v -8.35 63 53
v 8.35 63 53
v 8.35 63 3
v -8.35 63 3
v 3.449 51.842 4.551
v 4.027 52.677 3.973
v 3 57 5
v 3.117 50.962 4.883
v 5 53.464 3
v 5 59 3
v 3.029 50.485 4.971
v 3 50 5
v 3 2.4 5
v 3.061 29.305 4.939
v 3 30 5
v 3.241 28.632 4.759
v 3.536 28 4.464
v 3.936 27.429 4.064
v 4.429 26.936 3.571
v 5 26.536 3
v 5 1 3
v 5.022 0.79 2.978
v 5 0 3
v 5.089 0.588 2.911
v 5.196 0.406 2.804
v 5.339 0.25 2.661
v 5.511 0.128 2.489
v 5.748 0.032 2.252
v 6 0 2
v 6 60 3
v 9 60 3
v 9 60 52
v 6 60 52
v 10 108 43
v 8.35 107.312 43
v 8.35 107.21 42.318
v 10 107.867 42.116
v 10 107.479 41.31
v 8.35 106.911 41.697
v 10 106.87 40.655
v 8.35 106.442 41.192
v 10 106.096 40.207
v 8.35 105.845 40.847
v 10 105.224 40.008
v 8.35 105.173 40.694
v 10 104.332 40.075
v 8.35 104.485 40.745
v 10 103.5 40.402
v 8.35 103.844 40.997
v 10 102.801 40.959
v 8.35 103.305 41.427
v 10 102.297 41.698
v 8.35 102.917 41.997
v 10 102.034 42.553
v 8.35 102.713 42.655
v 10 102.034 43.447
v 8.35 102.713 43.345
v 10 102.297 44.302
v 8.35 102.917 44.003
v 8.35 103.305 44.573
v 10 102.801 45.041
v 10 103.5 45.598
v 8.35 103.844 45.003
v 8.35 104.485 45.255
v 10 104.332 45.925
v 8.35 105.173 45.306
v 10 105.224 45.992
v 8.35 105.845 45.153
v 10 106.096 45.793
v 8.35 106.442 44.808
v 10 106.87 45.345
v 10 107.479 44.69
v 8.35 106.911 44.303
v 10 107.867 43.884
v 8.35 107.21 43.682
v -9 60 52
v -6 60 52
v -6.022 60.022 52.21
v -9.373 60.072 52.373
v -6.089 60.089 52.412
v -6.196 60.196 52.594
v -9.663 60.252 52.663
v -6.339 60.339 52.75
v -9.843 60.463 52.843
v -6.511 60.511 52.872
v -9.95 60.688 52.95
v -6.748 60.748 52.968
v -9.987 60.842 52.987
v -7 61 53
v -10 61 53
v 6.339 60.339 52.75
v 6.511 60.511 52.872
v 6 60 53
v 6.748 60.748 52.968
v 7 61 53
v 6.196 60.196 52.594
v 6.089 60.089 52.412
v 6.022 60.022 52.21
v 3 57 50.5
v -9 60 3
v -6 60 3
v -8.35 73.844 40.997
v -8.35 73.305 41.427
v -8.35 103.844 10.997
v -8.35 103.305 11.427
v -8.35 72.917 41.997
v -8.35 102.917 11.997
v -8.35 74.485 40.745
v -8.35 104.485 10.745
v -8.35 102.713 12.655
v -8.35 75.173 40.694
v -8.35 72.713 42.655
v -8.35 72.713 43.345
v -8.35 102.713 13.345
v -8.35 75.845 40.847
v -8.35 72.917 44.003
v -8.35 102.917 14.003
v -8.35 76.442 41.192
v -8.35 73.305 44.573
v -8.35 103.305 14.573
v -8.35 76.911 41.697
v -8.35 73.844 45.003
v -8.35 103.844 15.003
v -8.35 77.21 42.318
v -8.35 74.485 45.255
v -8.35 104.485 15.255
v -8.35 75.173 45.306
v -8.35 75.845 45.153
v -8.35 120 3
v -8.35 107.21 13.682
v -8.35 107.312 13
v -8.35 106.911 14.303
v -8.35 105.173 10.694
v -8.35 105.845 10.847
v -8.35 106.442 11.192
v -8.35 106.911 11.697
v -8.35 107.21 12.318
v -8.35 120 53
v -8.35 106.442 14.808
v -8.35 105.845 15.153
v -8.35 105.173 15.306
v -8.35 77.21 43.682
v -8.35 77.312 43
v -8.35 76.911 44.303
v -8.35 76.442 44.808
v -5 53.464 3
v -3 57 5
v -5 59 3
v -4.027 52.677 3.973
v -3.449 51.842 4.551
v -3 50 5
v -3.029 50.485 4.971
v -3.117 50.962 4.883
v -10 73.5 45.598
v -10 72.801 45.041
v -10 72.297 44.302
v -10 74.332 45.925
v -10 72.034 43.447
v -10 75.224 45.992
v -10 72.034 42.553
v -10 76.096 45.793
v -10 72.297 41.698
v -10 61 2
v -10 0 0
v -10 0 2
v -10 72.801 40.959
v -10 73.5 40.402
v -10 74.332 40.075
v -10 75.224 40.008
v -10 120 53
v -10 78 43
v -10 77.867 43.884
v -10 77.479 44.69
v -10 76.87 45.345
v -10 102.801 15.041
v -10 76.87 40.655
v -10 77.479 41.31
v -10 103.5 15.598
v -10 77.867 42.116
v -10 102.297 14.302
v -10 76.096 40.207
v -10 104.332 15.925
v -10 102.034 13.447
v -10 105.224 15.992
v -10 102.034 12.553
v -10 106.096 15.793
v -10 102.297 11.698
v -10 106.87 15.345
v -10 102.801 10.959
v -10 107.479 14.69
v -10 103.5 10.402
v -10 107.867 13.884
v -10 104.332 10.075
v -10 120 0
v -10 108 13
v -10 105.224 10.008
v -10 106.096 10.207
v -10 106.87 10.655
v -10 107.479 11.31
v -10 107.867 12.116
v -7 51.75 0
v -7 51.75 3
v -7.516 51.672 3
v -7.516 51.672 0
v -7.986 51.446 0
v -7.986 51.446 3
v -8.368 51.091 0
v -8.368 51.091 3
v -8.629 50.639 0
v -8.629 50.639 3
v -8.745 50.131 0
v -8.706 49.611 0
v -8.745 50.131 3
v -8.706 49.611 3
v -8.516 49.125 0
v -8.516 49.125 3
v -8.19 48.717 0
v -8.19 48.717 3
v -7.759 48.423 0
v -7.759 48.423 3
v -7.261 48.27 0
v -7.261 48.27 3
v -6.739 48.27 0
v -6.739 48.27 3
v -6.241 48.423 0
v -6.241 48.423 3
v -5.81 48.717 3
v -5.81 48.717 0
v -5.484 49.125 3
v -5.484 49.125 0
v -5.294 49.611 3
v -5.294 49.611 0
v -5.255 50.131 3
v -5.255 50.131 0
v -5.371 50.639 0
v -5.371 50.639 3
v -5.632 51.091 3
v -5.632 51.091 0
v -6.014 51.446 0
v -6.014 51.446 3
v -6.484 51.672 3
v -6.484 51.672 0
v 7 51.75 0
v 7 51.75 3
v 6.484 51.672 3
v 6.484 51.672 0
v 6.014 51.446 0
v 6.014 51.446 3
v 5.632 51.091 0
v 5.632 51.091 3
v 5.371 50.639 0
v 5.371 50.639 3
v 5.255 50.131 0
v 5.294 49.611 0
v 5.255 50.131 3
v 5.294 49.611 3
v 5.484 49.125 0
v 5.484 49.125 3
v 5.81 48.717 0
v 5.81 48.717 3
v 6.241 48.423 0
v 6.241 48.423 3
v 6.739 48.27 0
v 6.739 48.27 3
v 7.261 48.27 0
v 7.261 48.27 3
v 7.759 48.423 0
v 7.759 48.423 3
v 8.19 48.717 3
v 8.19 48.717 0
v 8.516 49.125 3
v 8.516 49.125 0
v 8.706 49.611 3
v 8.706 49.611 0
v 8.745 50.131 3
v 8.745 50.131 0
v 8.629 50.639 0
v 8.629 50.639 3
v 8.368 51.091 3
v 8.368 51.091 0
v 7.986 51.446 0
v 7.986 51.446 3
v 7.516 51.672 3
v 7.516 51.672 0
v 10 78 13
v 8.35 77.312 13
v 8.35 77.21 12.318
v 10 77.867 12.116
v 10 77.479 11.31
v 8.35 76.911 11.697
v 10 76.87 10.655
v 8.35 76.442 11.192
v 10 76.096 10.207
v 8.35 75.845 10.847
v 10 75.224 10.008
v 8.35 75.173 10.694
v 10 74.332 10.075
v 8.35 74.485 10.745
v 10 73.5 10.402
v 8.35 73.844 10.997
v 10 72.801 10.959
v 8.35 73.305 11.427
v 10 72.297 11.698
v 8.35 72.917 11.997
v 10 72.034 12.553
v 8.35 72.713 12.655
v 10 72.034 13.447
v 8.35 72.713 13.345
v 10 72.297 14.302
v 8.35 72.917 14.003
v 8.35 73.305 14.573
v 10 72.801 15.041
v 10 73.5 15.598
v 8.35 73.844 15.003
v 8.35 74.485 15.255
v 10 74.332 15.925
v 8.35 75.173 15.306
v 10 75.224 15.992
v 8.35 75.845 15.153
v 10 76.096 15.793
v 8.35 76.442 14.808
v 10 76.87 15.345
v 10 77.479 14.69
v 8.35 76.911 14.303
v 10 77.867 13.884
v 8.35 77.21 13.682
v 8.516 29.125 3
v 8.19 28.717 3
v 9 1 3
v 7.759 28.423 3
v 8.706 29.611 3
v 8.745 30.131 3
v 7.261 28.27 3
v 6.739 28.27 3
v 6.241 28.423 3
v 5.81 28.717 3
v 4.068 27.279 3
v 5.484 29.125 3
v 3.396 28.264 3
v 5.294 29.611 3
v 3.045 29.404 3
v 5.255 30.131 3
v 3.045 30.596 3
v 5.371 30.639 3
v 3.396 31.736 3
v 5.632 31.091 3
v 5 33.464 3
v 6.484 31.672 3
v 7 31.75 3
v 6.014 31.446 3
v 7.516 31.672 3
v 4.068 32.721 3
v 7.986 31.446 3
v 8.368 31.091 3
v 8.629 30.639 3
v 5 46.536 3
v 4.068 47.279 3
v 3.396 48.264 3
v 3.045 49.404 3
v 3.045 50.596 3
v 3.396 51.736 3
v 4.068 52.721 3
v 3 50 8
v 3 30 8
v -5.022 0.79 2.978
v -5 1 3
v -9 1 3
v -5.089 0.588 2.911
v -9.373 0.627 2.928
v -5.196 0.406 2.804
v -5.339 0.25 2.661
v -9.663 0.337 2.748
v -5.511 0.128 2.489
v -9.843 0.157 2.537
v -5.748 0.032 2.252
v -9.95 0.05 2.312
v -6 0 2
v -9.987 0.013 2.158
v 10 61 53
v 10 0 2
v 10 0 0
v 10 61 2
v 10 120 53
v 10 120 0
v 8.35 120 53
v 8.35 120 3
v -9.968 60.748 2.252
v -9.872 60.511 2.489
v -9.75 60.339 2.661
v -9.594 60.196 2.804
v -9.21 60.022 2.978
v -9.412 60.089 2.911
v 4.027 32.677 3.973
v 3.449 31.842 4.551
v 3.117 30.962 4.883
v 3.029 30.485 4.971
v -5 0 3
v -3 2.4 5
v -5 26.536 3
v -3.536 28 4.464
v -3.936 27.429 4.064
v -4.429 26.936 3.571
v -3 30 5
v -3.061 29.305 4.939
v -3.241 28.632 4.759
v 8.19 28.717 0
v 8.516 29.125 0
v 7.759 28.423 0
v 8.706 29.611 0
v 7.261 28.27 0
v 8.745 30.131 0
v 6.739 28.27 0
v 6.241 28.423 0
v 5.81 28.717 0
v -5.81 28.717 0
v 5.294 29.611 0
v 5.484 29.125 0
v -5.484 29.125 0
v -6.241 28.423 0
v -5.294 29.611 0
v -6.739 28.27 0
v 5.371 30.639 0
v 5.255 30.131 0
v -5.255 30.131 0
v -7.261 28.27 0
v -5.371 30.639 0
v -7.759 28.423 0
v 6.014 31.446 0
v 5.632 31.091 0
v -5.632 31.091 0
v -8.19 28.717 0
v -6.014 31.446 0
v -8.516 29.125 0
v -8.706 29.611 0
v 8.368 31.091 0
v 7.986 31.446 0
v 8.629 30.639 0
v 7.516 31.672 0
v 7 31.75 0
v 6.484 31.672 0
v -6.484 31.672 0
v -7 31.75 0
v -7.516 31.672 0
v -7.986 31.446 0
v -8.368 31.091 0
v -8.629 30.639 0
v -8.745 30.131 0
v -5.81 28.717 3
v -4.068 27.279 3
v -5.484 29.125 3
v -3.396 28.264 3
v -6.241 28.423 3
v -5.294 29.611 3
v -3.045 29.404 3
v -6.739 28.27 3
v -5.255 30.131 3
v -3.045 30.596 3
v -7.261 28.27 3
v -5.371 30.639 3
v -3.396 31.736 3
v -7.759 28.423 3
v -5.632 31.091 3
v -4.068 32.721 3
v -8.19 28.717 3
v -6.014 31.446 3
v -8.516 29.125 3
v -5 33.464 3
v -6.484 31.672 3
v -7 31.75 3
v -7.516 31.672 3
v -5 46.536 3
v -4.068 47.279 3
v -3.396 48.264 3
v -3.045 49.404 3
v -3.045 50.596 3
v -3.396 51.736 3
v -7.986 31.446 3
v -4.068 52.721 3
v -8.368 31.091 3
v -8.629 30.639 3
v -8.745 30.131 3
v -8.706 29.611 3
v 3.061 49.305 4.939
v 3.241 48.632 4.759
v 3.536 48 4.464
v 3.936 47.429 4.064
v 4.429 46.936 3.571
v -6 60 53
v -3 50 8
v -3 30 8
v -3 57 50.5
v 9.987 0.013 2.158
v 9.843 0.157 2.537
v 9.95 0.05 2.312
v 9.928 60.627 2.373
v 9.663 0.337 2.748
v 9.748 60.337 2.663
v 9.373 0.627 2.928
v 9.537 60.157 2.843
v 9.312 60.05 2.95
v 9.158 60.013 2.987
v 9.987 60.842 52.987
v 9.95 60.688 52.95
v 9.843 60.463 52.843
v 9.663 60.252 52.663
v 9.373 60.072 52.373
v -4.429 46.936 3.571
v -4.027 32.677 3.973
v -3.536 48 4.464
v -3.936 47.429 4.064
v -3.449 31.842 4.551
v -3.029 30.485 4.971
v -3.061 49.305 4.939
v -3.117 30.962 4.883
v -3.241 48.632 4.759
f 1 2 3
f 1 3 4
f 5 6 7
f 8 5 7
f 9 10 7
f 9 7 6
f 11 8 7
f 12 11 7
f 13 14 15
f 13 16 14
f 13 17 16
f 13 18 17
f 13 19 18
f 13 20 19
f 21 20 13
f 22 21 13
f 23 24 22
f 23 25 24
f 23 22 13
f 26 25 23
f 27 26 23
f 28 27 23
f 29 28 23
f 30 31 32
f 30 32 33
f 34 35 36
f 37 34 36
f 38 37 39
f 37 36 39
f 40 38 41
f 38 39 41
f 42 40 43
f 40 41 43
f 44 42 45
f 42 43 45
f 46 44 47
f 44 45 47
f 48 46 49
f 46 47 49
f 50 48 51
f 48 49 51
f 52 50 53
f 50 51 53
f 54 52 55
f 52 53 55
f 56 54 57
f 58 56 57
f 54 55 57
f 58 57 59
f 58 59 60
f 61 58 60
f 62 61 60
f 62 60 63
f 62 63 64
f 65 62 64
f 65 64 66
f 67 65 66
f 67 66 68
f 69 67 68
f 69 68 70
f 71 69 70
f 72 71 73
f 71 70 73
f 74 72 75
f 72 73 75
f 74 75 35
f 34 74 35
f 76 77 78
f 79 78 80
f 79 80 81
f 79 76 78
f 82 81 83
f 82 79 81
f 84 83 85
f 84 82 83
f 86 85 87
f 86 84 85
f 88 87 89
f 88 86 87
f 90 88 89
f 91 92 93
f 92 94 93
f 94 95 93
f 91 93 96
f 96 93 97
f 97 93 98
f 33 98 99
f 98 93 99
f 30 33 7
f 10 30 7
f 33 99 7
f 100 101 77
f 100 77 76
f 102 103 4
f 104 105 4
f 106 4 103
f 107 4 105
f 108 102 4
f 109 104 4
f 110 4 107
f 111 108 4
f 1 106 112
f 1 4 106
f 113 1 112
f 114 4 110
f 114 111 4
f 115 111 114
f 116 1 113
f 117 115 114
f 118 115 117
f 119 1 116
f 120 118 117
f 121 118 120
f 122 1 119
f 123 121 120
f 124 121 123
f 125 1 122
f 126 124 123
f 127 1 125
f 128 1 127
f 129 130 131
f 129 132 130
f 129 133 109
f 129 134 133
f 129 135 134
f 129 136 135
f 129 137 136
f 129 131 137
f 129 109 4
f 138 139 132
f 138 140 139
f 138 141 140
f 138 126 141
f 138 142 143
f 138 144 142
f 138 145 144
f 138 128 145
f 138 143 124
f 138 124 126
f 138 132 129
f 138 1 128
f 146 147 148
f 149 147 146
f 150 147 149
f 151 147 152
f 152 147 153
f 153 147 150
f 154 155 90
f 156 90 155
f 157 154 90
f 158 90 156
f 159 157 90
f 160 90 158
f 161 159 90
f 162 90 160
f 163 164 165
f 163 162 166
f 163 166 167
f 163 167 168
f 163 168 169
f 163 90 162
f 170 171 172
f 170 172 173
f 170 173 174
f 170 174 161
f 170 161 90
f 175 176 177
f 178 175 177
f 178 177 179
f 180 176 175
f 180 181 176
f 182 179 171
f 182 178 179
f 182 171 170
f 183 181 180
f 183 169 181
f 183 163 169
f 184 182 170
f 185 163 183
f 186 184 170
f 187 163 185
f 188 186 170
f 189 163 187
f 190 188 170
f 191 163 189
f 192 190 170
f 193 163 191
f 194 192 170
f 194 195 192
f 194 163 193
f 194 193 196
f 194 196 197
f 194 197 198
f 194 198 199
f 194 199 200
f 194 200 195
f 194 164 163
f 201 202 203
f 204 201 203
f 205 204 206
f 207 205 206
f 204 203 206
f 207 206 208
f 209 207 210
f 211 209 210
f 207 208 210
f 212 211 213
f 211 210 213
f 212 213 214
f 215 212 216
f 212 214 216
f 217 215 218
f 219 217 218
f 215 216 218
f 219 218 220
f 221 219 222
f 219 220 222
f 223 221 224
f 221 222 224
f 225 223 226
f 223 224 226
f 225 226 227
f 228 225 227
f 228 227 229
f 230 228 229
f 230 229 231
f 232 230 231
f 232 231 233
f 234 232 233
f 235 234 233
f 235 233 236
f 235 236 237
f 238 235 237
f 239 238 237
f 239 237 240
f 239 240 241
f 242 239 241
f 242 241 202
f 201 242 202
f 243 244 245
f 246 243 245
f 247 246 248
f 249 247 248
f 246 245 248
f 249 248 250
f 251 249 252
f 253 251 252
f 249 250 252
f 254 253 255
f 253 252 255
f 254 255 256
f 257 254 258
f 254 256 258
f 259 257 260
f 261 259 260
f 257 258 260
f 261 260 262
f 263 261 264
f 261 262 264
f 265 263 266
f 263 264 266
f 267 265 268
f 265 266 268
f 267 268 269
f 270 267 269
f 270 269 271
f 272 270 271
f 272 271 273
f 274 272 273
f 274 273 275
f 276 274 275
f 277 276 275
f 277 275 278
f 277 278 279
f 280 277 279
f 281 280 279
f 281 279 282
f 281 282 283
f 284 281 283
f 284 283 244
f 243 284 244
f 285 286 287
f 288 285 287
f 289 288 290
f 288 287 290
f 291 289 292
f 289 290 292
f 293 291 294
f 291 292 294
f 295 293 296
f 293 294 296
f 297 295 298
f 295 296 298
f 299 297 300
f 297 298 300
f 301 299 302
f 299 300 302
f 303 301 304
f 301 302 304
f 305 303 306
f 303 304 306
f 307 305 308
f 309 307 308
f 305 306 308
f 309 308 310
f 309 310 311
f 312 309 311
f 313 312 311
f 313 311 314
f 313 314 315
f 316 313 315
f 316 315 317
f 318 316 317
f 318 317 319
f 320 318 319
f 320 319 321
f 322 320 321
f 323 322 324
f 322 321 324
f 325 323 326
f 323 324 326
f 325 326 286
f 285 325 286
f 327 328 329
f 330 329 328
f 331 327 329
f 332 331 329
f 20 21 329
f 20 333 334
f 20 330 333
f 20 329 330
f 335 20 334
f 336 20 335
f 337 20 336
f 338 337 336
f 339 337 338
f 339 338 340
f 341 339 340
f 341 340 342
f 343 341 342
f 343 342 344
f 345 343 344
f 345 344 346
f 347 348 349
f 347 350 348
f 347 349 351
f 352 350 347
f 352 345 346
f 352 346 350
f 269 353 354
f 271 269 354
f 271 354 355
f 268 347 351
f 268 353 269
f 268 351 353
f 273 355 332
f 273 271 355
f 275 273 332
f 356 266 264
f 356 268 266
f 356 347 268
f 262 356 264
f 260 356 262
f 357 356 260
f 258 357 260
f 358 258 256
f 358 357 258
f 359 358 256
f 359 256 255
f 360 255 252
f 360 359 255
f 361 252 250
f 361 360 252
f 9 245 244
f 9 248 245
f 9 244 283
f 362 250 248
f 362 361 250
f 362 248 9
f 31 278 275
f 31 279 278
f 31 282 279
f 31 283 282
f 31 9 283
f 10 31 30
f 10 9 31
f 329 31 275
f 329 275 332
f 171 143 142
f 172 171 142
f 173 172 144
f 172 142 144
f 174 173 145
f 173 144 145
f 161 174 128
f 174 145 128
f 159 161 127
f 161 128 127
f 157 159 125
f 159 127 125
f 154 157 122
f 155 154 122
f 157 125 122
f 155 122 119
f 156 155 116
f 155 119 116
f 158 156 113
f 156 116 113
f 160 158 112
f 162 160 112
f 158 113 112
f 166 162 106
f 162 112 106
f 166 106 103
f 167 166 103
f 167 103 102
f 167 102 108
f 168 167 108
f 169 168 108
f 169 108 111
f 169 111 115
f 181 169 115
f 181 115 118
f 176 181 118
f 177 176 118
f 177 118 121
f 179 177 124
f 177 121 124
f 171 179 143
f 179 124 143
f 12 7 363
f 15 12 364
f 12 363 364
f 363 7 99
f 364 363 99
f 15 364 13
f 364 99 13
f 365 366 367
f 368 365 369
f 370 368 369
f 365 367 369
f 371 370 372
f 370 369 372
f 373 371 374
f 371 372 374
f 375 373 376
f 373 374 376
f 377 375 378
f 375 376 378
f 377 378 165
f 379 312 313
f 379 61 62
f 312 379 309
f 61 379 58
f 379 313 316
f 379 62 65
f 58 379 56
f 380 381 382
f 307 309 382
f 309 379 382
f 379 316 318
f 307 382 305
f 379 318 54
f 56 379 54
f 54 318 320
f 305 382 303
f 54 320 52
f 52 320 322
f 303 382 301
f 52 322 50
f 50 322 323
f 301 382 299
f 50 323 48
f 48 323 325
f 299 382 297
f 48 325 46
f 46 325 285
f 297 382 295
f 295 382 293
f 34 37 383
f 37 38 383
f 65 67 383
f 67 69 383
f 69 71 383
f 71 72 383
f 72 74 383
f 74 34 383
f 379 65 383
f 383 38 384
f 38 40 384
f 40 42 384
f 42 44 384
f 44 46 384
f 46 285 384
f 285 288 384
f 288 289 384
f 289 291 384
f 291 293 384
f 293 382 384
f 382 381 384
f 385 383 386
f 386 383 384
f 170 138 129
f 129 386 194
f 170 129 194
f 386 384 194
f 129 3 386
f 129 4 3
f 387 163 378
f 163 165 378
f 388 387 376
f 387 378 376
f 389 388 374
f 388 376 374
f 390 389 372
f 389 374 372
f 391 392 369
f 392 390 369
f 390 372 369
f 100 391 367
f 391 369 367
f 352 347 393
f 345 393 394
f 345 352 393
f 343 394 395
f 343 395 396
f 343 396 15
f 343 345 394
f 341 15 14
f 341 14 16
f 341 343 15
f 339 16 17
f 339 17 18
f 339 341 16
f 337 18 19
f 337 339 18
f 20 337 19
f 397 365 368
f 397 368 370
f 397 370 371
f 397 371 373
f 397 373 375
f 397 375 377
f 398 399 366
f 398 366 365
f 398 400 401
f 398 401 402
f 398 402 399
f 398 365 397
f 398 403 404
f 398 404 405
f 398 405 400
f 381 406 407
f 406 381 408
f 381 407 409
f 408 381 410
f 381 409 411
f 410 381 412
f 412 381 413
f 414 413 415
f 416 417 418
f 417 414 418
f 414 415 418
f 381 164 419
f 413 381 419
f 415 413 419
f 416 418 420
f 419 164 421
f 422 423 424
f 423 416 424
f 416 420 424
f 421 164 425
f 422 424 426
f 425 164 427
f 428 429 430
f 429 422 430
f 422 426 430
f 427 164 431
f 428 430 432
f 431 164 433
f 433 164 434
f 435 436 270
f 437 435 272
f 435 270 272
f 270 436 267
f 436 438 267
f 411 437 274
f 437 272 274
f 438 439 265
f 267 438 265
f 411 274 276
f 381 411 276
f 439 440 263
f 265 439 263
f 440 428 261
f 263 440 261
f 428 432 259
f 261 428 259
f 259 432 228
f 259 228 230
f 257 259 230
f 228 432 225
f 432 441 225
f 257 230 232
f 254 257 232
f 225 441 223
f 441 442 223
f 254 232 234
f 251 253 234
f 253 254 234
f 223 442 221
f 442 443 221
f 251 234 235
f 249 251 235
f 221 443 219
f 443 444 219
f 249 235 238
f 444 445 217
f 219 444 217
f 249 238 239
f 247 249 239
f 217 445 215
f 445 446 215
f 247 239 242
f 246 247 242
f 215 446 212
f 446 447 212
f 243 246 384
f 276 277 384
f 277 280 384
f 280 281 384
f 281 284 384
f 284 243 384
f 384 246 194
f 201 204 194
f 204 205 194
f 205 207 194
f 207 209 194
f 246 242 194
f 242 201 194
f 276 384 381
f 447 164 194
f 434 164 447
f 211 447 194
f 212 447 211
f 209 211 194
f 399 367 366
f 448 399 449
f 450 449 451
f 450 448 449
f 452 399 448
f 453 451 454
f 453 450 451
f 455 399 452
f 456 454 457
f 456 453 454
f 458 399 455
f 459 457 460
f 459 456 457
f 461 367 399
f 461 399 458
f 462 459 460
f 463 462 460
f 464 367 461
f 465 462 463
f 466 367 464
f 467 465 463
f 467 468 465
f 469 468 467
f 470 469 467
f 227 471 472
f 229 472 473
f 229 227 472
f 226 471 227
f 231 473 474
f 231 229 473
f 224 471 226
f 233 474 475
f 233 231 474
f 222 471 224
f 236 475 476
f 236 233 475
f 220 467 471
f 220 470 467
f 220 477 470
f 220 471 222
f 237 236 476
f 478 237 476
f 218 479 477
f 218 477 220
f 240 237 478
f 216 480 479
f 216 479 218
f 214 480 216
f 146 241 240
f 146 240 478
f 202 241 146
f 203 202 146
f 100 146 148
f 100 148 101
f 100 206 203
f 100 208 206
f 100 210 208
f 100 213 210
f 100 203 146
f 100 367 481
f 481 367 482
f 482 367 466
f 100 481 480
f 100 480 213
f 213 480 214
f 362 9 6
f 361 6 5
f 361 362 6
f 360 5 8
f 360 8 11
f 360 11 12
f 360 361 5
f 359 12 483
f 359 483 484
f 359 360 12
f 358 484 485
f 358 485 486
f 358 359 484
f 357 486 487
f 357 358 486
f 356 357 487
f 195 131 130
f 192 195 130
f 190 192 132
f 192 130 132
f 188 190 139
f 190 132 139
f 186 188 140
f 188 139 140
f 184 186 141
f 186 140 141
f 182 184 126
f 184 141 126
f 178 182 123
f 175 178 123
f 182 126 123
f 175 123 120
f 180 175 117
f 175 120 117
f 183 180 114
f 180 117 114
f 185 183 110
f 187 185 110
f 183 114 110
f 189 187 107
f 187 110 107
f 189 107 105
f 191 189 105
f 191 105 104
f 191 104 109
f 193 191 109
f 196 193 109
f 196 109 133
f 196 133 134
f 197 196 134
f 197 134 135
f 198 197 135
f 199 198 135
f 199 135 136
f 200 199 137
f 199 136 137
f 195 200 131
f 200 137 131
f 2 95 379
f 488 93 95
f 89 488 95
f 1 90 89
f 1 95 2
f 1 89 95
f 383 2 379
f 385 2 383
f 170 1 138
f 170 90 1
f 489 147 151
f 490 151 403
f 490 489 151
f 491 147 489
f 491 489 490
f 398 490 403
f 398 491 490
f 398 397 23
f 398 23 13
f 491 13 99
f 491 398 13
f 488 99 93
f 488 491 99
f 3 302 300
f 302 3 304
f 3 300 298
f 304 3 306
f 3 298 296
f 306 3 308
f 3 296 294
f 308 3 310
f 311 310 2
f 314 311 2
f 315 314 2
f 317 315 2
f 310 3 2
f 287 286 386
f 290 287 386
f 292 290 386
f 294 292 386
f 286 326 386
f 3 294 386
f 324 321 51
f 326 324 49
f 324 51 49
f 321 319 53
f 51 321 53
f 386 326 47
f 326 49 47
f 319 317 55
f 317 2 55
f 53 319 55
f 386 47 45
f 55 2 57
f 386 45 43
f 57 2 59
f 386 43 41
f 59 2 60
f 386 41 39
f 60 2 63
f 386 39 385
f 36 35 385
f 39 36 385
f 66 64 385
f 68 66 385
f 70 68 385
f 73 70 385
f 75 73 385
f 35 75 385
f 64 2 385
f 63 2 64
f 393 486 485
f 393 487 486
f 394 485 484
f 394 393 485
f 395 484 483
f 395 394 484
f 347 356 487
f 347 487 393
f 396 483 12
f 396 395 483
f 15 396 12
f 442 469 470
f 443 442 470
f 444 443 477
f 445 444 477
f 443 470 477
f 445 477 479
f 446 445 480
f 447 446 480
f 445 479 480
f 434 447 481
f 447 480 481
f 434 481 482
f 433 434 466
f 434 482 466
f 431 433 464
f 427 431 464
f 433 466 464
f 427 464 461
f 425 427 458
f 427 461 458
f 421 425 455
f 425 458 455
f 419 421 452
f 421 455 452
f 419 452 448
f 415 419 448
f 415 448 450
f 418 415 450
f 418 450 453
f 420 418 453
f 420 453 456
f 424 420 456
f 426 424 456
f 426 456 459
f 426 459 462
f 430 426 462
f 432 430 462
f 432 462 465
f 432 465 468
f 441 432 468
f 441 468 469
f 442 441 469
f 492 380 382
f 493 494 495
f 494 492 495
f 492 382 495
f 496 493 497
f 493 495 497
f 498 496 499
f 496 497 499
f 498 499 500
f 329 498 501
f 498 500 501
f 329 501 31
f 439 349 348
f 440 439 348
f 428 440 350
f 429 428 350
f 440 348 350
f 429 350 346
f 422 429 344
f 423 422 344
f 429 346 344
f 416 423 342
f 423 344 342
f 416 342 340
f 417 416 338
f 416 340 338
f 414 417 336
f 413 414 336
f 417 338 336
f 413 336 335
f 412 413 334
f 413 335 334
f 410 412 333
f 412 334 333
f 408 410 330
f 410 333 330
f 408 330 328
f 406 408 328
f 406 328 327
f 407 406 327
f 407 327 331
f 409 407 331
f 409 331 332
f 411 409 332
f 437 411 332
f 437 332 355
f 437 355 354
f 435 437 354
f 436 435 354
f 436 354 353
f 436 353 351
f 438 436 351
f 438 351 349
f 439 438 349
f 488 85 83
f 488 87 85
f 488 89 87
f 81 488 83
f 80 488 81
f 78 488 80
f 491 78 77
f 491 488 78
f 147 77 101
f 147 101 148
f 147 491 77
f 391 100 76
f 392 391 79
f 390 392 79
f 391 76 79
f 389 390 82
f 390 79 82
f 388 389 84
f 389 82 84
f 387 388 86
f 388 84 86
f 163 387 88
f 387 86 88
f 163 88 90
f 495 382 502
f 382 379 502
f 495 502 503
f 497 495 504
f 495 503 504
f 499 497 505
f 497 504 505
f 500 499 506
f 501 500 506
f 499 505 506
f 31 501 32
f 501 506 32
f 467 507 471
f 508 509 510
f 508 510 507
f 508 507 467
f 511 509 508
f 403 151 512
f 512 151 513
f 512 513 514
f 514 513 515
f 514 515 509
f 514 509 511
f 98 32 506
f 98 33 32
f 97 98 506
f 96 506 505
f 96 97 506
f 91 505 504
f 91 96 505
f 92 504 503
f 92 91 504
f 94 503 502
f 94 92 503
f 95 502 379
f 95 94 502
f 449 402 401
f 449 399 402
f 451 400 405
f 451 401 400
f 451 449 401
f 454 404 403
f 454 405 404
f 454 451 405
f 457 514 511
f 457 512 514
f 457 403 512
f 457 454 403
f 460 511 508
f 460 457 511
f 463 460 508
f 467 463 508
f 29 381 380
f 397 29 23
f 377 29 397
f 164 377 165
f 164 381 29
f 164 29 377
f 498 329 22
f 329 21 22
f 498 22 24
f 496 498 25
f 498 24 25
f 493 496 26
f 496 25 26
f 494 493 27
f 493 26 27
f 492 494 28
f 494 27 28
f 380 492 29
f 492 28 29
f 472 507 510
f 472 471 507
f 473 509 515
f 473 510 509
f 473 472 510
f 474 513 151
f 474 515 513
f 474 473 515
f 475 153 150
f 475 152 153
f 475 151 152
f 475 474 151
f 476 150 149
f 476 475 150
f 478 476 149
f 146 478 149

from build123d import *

# Parameters (mm, degrees)
CYLINDER003_R          = 4
CYLINDER003_DEPTH      = 5
CYLINDER002_R          = 4
CYLINDER002_DEPTH      = 5
CYLINDER001_R          = 4
CYLINDER001_DEPTH      = 5
CYLINDER_R             = 4
CYLINDER_DEPTH         = 5
CONE003_ROLL_ANGLE     = 90
CONE002_ROLL_ANGLE     = 90
CONE001_ROLL_ANGLE     = -90
CONE_ROLL_ANGLE        = -90
BOX001_W               = 60
BOX001_H               = 20
BOX001_DEPTH           = 50
SKETCH001_W            = 57
SKETCH001_H            = 16.7
POCKET001_DEPTH        = 50
PAD_DEPTH              = 6
BOX_W                  = 120
BOX_H                  = 20
BOX_DEPTH              = 3
SKETCH_R               = 1.75
POCKET_DEPTH           = 3.001
CHAMFER_SIZE           = 3
CHAMFER001_SIZE        = 2
FILLET_R               = 1
FILLET_PLACEMENT_ANGLE = 90


with BuildPart() as cylinder003:
    # Cylinder003 → Cylinder003 (new body)
    with BuildSketch(Plane(origin=(50, 7, 3), x_dir=(1, 0, 0), z_dir=(0, 0, 1))):
        Circle(CYLINDER003_R)
    extrude(amount=CYLINDER003_DEPTH)


with BuildPart() as cylinder002:
    # Cylinder002 → Cylinder002 (new body)
    with BuildSketch(Plane(origin=(30, 7, 3), x_dir=(1, 0, 0), z_dir=(0, 0, 1))):
        Circle(CYLINDER002_R)
    extrude(amount=CYLINDER002_DEPTH)


with BuildPart() as cylinder001:
    # Cylinder001 → Cylinder001 (new body)
    with BuildSketch(Plane(origin=(50, -7, 3), x_dir=(1, 0, 0), z_dir=(0, 0, 1))):
        Circle(CYLINDER001_R)
    extrude(amount=CYLINDER001_DEPTH)


with BuildPart() as cylinder:
    # Cylinder → Cylinder (new body)
    with BuildSketch(Plane(origin=(30, -7, 3), x_dir=(1, 0, 0), z_dir=(0, 0, 1))):
        Circle(CYLINDER_R)
    extrude(amount=CYLINDER_DEPTH)


with BuildPart() as cone003:
    # Cone003 → Cone003 (revolve)
    with BuildSketch(Plane.XZ):
        Polygon((0, 0), (3, 0), (1.75, 3), (0, 3), align=None)
    revolve(axis=Axis((0, 0, 0), (0, 0, 1)))


with BuildPart() as cone003_1:
    # Cone003 roll: moved
    add(cone003.part.rotate(Axis((0, 0, 0), (1, 0, 0)), CONE003_ROLL_ANGLE))


with BuildPart() as cone003_2:
    # Cone003 placement: moved
    add(cone003_1.part.moved(Location((75, 10, 43))))


with BuildPart() as cone002:
    # Cone002 → Cone002 (revolve)
    with BuildSketch(Plane.XZ):
        Polygon((0, 0), (3, 0), (1.75, 3), (0, 3), align=None)
    revolve(axis=Axis((0, 0, 0), (0, 0, 1)))


with BuildPart() as cone002_1:
    # Cone002 roll: moved
    add(cone002.part.rotate(Axis((0, 0, 0), (1, 0, 0)), CONE002_ROLL_ANGLE))


with BuildPart() as cone002_2:
    # Cone002 placement: moved
    add(cone002_1.part.moved(Location((105, 10, 13))))


with BuildPart() as cone001:
    # Cone001 → Cone001 (revolve)
    with BuildSketch(Plane.XZ):
        Polygon((0, 0), (3, 0), (1.75, 3), (0, 3), align=None)
    revolve(axis=Axis((0, 0, 0), (0, 0, 1)))


with BuildPart() as cone001_1:
    # Cone001 roll: moved
    add(cone001.part.rotate(Axis((0, 0, 0), (1, 0, 0)), CONE001_ROLL_ANGLE))


with BuildPart() as cone001_2:
    # Cone001 placement: moved
    add(cone001_1.part.moved(Location((105, -10, 43))))


with BuildPart() as cone:
    # Cone → Cone (revolve)
    with BuildSketch(Plane.XZ):
        Polygon((0, 0), (3, 0), (1.75, 3), (0, 3), align=None)
    revolve(axis=Axis((0, 0, 0), (0, 0, 1)))


with BuildPart() as cone_1:
    # Cone roll: moved
    add(cone.part.rotate(Axis((0, 0, 0), (1, 0, 0)), CONE_ROLL_ANGLE))


with BuildPart() as cone_2:
    # Cone placement: moved
    add(cone_1.part.moved(Location((75, -10, 13))))


with BuildPart() as abra_a_fusta_amb_forats:
    # Box001 → Box001 (new body)
    with BuildSketch(Plane(origin=(60, -10, 3), x_dir=(1, 0, 0), z_dir=(0, 0, 1))):
        with Locations((30, 10)):
            Rectangle(BOX001_W, BOX001_H)
    extrude(amount=BOX001_DEPTH)

    # Sketch001 → Pocket001 (cut)
    with BuildSketch(Plane(origin=(60, -10, 53), x_dir=(1, 0, 0), z_dir=(0, 0, 1))):
        with Locations((31.5, 10)):
            Rectangle(SKETCH001_W, SKETCH001_H)
    extrude(amount=-POCKET001_DEPTH, mode=Mode.SUBTRACT)

    # Cut: cut Cone
    add(cone_2.part, mode=Mode.SUBTRACT)

    # Cut001: cut Cone001
    add(cone001_2.part, mode=Mode.SUBTRACT)

    # Cut002: cut Cone002
    add(cone002_2.part, mode=Mode.SUBTRACT)

    # Cut003: cut Cone003
    add(cone003_2.part, mode=Mode.SUBTRACT)


with BuildPart() as triangle:
    # Sketch002 → Pad (new body)
    with BuildSketch(Plane.XZ.offset(-3)):
        Polygon((0, 3), (60, 53), (60, 3), align=None)
    extrude(amount=PAD_DEPTH)


with BuildPart() as triangle_y:
    # Box → Box (new body)
    with BuildSketch(Plane(origin=(0, -10, 0), x_dir=(1, 0, 0), z_dir=(0, 0, 1))):
        with Locations((60, 10)):
            Rectangle(BOX_W, BOX_H)
    extrude(amount=BOX_DEPTH)

    # Sketch → Pocket (cut, through all)
    with BuildSketch(Plane(origin=(0, -10, 3), x_dir=(1, 0, 0), z_dir=(0, 0, 1))):
        with Locations((30, 17)):
            Circle(SKETCH_R)
        with Locations((30, 3)):
            Circle(SKETCH_R)
        with Locations((50, 17)):
            Circle(SKETCH_R)
        with Locations((50, 3)):
            Circle(SKETCH_R)
    extrude(amount=-POCKET_DEPTH, mode=Mode.SUBTRACT)

    # Fusion: union abraça-fusta-amb-forats, triangle
    add(abra_a_fusta_amb_forats.part)
    add(triangle.part)

    # Chamfer
    chamfer_edges = [triangle_y.edges().sort_by_distance(p)[0] for p in [
        (60, -3, 28),
        (60, 3, 28),
    ]]
    chamfer(chamfer_edges, length=CHAMFER_SIZE)

    # Chamfer001
    chamfer001_edges = [triangle_y.edges().sort_by_distance(p)[0] for p in [
        (28.5, -3, 3),
        (28.5, 3, 3),
    ]]
    chamfer(chamfer001_edges, length=CHAMFER001_SIZE)

    # Cut004: cut Cylinder
    add(cylinder.part, mode=Mode.SUBTRACT)

    # Cut005: cut Cylinder001
    add(cylinder001.part, mode=Mode.SUBTRACT)

    # Cut006: cut Cylinder002
    add(cylinder002.part, mode=Mode.SUBTRACT)

    # Cut007: cut Cylinder003
    add(cylinder003.part, mode=Mode.SUBTRACT)

    # Fillet
    fillet_edges = [triangle_y.edges().sort_by_distance(p)[0] for p in [
        (0, -7.5, 3),
        (13.677124, -10, 3),
        (40, -10, 3),
        (56.322876, -10, 3),
        (60, -8, 53),
        (60, -10, 28),
        (0, 7.5, 3),
        (60, 8, 53),
        (60, 10, 28),
        (13.677124, 10, 3),
        (40, 10, 3),
        (56.322876, 10, 3),
    ]]
    fillet(fillet_edges, radius=FILLET_R)


with BuildPart() as triangle_y_1:
    # Fillet placement: moved
    add(triangle_y.part.rotate(Axis((0, 0, 0), (0, 0, 1)), FILLET_PLACEMENT_ANGLE))


solid = triangle_y_1.part
